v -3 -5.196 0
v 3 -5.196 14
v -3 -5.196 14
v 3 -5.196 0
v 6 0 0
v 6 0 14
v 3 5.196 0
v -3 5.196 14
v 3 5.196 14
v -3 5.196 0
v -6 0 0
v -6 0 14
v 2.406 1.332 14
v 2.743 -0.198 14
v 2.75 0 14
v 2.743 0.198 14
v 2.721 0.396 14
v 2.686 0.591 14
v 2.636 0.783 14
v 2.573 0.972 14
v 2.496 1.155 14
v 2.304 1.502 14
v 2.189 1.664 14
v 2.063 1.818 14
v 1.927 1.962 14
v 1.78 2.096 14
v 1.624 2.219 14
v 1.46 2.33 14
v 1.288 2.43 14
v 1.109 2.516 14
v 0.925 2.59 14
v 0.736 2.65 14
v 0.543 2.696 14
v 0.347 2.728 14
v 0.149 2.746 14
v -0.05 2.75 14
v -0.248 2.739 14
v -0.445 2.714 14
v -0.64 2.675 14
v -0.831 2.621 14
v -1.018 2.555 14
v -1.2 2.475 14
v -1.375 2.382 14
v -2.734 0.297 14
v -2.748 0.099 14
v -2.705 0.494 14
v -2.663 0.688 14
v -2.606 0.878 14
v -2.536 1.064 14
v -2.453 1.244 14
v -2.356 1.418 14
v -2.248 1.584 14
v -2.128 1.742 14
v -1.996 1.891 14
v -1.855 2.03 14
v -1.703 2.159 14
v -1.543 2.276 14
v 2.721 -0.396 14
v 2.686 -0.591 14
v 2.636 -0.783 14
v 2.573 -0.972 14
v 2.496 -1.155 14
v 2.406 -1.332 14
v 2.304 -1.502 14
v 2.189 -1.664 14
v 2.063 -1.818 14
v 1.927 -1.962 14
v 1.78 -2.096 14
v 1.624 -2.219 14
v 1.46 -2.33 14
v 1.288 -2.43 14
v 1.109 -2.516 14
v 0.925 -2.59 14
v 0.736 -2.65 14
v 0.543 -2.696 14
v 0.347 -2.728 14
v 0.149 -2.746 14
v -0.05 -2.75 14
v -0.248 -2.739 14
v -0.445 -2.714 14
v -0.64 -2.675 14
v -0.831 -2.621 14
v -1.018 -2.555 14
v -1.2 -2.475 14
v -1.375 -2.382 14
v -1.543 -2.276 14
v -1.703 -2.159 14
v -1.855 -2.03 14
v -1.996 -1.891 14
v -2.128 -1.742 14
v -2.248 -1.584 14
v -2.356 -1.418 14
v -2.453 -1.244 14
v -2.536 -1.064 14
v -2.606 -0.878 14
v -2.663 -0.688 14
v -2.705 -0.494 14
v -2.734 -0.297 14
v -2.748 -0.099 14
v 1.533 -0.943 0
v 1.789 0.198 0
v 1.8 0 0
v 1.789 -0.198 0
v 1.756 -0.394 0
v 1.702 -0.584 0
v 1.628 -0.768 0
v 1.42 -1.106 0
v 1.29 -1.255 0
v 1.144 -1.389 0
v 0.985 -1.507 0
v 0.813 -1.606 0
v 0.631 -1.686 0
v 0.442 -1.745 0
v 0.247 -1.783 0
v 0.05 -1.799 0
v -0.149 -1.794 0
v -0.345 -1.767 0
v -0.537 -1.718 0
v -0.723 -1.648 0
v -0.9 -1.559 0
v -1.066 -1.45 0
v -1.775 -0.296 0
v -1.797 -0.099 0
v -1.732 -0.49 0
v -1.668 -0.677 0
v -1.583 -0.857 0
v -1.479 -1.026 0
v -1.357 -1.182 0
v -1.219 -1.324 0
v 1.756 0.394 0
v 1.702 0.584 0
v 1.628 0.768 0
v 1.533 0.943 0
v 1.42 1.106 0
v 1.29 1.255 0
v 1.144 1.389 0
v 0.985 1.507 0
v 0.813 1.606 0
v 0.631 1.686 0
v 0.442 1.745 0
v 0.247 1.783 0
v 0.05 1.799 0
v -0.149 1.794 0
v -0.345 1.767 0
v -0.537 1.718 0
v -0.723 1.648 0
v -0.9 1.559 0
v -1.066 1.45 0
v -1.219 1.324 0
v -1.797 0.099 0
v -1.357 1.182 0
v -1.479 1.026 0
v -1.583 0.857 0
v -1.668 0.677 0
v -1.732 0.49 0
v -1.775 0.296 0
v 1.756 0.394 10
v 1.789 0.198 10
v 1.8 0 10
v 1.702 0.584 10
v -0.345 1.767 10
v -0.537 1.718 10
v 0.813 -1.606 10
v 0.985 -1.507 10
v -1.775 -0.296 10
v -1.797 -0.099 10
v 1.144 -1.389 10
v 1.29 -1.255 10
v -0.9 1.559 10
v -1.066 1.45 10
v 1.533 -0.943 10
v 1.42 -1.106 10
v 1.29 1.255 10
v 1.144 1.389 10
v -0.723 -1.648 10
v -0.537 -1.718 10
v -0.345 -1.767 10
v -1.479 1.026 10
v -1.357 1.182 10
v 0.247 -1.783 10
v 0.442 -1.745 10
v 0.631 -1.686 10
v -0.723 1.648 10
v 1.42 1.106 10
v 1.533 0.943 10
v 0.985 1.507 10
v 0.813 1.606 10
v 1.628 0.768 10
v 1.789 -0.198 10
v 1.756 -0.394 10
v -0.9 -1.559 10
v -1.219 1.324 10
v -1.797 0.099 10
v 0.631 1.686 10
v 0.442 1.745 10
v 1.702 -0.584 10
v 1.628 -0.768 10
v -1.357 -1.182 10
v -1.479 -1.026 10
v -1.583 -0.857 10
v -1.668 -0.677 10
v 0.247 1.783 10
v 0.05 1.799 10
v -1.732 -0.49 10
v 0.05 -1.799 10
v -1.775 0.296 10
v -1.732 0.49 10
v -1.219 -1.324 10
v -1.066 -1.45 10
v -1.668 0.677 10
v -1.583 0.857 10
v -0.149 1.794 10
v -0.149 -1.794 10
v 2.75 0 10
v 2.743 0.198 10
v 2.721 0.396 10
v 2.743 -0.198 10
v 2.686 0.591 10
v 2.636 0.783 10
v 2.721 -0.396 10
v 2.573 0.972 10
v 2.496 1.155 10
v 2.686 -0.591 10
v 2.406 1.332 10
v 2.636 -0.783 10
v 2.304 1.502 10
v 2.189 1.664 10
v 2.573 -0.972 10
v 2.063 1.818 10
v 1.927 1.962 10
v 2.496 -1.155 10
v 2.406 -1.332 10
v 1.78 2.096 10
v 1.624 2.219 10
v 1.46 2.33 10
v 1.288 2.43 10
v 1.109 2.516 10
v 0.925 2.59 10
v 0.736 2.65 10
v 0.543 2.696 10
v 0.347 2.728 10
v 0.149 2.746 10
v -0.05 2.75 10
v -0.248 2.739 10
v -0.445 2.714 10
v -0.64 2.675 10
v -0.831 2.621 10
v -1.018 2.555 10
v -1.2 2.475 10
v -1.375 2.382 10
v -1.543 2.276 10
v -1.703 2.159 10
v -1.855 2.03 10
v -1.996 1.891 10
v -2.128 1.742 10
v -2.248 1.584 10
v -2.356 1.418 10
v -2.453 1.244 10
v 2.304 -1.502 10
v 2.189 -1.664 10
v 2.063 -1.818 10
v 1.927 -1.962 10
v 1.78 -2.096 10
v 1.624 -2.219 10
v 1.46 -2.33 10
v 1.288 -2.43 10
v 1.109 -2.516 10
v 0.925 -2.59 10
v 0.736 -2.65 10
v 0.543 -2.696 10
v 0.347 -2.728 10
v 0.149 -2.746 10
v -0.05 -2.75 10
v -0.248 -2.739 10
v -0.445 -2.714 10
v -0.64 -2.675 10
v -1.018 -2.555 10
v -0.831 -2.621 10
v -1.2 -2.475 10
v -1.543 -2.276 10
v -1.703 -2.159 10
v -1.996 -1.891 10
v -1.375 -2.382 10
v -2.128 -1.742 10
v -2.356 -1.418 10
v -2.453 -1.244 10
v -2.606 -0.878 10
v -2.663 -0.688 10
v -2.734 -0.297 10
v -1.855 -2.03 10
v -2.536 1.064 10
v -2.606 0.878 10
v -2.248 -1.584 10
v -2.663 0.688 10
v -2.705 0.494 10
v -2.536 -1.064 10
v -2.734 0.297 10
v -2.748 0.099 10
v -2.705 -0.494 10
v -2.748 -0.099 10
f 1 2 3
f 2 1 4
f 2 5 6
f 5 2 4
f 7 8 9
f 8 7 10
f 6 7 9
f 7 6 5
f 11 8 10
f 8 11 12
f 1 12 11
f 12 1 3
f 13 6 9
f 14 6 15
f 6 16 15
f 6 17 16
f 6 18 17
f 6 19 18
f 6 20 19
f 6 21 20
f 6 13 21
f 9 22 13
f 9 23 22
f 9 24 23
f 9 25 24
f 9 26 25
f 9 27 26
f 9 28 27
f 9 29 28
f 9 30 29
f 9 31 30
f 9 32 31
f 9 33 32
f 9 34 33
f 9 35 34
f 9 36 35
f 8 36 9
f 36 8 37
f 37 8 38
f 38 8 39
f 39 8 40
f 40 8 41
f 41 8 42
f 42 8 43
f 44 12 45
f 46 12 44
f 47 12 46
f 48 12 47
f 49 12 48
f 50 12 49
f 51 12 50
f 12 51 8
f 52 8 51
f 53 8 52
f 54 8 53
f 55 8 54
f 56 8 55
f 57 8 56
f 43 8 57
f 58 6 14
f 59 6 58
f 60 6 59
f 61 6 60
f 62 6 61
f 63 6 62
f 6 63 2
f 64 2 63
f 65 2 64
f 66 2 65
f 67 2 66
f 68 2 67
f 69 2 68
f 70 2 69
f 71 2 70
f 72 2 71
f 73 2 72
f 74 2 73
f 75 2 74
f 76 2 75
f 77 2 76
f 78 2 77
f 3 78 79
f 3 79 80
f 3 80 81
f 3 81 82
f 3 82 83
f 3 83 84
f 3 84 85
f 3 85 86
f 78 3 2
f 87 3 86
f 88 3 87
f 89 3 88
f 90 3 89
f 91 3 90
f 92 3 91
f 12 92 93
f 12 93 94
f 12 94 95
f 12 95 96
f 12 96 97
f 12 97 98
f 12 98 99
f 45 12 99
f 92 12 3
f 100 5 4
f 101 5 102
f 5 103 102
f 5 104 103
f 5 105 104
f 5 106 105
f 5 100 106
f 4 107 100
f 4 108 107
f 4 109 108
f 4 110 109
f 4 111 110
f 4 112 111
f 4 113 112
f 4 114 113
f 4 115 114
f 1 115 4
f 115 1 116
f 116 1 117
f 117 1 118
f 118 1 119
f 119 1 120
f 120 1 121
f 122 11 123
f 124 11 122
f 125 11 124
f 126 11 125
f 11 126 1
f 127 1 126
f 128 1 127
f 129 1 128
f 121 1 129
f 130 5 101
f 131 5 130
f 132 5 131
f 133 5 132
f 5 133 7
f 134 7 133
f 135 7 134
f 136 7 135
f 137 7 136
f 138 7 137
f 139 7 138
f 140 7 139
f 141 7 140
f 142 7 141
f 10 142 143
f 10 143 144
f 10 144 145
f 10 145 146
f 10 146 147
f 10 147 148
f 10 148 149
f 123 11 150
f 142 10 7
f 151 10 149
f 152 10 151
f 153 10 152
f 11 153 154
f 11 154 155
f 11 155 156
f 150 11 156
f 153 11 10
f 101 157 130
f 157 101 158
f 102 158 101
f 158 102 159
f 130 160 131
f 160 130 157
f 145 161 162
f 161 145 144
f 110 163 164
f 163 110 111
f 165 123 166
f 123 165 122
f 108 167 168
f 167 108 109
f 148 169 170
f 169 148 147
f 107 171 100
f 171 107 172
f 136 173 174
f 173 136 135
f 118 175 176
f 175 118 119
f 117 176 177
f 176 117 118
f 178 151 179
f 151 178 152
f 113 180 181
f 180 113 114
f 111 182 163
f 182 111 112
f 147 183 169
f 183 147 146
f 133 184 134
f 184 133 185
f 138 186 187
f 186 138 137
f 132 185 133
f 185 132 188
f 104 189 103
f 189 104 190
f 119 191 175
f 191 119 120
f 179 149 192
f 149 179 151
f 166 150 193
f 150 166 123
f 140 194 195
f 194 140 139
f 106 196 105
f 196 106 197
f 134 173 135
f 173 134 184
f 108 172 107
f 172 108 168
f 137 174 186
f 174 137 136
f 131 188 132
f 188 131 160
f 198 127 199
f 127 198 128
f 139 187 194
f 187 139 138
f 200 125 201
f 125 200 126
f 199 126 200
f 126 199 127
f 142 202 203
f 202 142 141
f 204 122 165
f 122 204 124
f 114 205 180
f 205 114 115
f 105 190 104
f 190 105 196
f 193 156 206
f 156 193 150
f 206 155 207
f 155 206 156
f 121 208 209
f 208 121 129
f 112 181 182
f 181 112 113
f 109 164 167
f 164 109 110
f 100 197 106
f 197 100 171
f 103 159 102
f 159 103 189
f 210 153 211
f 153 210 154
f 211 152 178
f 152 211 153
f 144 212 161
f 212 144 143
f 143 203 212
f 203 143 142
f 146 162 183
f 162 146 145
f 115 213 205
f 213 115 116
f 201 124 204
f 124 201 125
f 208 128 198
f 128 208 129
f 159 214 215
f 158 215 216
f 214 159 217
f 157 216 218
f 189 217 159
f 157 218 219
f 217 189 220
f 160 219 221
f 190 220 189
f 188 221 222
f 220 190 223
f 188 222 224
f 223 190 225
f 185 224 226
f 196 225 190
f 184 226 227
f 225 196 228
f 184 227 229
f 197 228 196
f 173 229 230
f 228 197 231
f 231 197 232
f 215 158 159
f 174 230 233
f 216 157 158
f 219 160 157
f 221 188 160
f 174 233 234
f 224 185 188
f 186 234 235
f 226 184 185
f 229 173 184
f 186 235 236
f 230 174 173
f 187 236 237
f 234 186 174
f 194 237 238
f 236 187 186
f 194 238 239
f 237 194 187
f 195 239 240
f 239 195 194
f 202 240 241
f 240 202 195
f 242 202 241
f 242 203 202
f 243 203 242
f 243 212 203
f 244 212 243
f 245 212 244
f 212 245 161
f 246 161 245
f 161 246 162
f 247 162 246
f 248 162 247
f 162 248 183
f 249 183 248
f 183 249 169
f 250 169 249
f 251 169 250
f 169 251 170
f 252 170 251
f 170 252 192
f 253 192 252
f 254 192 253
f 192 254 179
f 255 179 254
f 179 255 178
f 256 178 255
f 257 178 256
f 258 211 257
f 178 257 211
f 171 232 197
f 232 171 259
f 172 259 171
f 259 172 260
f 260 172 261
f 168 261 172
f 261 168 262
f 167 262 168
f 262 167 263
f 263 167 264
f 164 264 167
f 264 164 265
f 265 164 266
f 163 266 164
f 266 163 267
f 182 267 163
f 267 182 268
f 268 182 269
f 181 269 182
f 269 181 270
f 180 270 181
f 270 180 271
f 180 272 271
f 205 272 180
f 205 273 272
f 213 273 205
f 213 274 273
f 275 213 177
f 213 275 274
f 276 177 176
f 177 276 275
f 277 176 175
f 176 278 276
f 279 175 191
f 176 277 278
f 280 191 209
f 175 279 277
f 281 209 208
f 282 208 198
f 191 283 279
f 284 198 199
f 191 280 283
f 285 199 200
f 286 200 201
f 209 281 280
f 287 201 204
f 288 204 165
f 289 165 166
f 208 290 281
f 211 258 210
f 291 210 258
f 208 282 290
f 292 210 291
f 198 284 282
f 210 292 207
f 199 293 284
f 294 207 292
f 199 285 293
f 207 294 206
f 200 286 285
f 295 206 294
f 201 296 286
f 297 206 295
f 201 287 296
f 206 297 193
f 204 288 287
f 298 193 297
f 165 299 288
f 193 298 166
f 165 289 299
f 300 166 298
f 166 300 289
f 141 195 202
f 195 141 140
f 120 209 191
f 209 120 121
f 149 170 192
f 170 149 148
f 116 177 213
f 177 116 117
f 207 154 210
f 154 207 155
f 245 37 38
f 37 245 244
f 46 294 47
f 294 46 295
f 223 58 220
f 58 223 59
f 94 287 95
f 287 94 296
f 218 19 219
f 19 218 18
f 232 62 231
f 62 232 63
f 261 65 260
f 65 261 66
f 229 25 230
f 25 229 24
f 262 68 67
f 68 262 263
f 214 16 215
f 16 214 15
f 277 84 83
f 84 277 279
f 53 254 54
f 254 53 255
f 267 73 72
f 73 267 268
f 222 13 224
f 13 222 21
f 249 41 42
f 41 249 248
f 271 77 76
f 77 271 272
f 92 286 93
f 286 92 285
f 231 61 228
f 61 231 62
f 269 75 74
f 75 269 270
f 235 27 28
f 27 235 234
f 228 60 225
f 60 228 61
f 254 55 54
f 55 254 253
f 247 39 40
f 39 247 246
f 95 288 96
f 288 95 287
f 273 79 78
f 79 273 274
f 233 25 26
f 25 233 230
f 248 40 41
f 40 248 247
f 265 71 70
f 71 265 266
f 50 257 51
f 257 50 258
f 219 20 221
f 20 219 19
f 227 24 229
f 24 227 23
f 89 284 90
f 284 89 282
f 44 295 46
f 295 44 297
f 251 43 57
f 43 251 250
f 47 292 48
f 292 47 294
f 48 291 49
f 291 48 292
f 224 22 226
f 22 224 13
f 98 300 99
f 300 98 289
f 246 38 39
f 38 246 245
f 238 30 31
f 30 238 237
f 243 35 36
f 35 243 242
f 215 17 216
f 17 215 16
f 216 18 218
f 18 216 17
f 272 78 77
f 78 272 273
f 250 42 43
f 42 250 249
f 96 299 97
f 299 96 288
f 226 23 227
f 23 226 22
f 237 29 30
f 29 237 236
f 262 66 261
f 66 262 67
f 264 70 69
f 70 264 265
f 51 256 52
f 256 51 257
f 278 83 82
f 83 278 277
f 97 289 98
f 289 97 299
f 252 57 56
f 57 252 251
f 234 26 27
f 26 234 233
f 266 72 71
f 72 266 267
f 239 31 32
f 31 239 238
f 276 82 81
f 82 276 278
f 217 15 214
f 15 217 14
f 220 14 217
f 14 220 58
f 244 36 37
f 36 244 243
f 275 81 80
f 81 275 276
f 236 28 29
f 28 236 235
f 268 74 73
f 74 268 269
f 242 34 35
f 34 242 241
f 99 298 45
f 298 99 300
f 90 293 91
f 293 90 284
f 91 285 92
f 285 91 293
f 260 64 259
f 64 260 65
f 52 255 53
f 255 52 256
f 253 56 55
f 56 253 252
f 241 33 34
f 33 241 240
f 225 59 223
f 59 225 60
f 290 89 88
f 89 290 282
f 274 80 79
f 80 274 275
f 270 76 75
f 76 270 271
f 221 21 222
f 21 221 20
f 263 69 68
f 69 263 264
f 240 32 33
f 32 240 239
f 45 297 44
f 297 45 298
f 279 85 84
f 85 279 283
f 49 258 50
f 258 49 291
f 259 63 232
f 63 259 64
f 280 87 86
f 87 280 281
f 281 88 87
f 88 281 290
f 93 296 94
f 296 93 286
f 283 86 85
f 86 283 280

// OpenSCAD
// file: ../common/common.scad
// (C) 2023 Dmytry Lavrov

module box(low, high){
    translate(low){
        cube(high-low);
    }
}

module mirror_duplicate(v){
    children();
    mirror(v=v)children();
}

module x_mirror(){
    mirror_duplicate(v=[1,0,0])children();
}
module y_mirror(){
    mirror_duplicate(v=[0,1,0])children();
}
module xy_mirror(){
    mirror_duplicate(v=[1,0,0])mirror_duplicate(v=[0,1,0])children();
}

module four_corners(low, high){
    translate([low[0], low[1], 0])children();
    translate([high[0], low[1], 0])children();
    translate([high[0], high[1], 0])children();
    translate([low[0], high[1], 0])children();  
}

module cyl_rounded_box(low, high, r){
    h=high[2]-low[2];
    translate([0, 0, low[2]]){
        hull(){
            translate([low[0]+r, low[1]+r, 0])cylinder(h, r=r);
            translate([high[0]-r, low[1]+r, 0])cylinder(h, r=r);
            translate([high[0]-r, high[1]-r, 0])cylinder(h, r=r);
            translate([low[0]+r, high[1]-r, 0])cylinder(h, r=r);
        }
    }
}

module rounded_box(l, h, r){
    hull(){
        translate([l[0]+r, l[1]+r, l[2]+r])sphere(r);        
        translate([l[0]+r, l[1]+r, h[2]-r]) sphere(r);
        translate([l[0]+r, h[1]-r, l[2]+r]) sphere(r);
        translate([l[0]+r, h[1]-r, h[2]-r]) sphere(r);
        
        translate([h[0]-r, l[1]+r, l[2]+r]) sphere(r);
        translate([h[0]-r, l[1]+r, h[2]-r]) sphere(r);
        translate([h[0]-r, h[1]-r, l[2]+r]) sphere(r);
        translate([h[0]-r, h[1]-r, h[2]-r]) sphere(r);
    }
}

module skel_cyl_rounded_box(low, high, ir, or, outer=true, right_side=true){
    h=high[2]-low[2];
    translate([0, 0, low[2]])
    difference(){
        union(){
            translate([low[0], low[1], 0])cylinder(h, r=or);
            translate([high[0], low[1], 0])cylinder(h, r=or);
            translate([high[0], high[1], 0])cylinder(h, r=or);
            translate([low[0], high[1], 0])cylinder(h, r=or);
            // outer shell
            if(outer){
                box([low[0], low[1]-or, 0], [high[0], low[1]-ir, h]);            
                box([low[0], high[1]+ir, 0], [high[0], high[1]+or, h]);
                
                box([low[0]-or, low[1], 0], [low[0]-ir, high[1], h]);
                
                if(right_side)box([high[0]+ir, low[1], 0], [high[0]+or, high[1], h]);
            }

            // inner shell            
            box([low[0], low[1]+ir, 0], [high[0], low[1]+or, h]);            
            box([low[0], high[1]-or, 0], [high[0], high[1]-ir, h]);
            
            box([low[0]+ir, low[1], 0], [low[0]+or, high[1], h]);
            box([high[0]-or, low[1], 0], [high[0]-ir, high[1], h]);
        }
        translate([low[0], low[1], 0])cylinder(h, r=ir);
        translate([high[0], low[1], 0])cylinder(h, r=ir);
        translate([high[0], high[1], 0])cylinder(h, r=ir);
        translate([low[0], high[1], 0])cylinder(h, r=ir);
    }
}

module sequential_hull(){
    if($children<2){
        hull()children();
    }else{
        for (i = [0: $children-2])
            hull(){
                children(i);
                children(i+1);
            }
    }
}

module teardrop(r){// sphere with a hat, purpose: avoid overhangs
    union(){
        sphere(r);
        translate([0,0,r*sqrt(0.5)])cylinder(r*sqrt(0.5), r1=r*sqrt(0.5), r2=0);
    }
}

module up(z){
    translate([0,0,z])children();
}
// main file
// (C) 2023 Dmytry Lavrov.
use <../common/common.scad>

$fa=3;
$fs=0.2;
large=1000;

difference(){
    cylinder(14,r=6, $fn=6);
    cylinder(10, r=3.6/2);
    up(10)cylinder(5, r=5.5/2);
}
